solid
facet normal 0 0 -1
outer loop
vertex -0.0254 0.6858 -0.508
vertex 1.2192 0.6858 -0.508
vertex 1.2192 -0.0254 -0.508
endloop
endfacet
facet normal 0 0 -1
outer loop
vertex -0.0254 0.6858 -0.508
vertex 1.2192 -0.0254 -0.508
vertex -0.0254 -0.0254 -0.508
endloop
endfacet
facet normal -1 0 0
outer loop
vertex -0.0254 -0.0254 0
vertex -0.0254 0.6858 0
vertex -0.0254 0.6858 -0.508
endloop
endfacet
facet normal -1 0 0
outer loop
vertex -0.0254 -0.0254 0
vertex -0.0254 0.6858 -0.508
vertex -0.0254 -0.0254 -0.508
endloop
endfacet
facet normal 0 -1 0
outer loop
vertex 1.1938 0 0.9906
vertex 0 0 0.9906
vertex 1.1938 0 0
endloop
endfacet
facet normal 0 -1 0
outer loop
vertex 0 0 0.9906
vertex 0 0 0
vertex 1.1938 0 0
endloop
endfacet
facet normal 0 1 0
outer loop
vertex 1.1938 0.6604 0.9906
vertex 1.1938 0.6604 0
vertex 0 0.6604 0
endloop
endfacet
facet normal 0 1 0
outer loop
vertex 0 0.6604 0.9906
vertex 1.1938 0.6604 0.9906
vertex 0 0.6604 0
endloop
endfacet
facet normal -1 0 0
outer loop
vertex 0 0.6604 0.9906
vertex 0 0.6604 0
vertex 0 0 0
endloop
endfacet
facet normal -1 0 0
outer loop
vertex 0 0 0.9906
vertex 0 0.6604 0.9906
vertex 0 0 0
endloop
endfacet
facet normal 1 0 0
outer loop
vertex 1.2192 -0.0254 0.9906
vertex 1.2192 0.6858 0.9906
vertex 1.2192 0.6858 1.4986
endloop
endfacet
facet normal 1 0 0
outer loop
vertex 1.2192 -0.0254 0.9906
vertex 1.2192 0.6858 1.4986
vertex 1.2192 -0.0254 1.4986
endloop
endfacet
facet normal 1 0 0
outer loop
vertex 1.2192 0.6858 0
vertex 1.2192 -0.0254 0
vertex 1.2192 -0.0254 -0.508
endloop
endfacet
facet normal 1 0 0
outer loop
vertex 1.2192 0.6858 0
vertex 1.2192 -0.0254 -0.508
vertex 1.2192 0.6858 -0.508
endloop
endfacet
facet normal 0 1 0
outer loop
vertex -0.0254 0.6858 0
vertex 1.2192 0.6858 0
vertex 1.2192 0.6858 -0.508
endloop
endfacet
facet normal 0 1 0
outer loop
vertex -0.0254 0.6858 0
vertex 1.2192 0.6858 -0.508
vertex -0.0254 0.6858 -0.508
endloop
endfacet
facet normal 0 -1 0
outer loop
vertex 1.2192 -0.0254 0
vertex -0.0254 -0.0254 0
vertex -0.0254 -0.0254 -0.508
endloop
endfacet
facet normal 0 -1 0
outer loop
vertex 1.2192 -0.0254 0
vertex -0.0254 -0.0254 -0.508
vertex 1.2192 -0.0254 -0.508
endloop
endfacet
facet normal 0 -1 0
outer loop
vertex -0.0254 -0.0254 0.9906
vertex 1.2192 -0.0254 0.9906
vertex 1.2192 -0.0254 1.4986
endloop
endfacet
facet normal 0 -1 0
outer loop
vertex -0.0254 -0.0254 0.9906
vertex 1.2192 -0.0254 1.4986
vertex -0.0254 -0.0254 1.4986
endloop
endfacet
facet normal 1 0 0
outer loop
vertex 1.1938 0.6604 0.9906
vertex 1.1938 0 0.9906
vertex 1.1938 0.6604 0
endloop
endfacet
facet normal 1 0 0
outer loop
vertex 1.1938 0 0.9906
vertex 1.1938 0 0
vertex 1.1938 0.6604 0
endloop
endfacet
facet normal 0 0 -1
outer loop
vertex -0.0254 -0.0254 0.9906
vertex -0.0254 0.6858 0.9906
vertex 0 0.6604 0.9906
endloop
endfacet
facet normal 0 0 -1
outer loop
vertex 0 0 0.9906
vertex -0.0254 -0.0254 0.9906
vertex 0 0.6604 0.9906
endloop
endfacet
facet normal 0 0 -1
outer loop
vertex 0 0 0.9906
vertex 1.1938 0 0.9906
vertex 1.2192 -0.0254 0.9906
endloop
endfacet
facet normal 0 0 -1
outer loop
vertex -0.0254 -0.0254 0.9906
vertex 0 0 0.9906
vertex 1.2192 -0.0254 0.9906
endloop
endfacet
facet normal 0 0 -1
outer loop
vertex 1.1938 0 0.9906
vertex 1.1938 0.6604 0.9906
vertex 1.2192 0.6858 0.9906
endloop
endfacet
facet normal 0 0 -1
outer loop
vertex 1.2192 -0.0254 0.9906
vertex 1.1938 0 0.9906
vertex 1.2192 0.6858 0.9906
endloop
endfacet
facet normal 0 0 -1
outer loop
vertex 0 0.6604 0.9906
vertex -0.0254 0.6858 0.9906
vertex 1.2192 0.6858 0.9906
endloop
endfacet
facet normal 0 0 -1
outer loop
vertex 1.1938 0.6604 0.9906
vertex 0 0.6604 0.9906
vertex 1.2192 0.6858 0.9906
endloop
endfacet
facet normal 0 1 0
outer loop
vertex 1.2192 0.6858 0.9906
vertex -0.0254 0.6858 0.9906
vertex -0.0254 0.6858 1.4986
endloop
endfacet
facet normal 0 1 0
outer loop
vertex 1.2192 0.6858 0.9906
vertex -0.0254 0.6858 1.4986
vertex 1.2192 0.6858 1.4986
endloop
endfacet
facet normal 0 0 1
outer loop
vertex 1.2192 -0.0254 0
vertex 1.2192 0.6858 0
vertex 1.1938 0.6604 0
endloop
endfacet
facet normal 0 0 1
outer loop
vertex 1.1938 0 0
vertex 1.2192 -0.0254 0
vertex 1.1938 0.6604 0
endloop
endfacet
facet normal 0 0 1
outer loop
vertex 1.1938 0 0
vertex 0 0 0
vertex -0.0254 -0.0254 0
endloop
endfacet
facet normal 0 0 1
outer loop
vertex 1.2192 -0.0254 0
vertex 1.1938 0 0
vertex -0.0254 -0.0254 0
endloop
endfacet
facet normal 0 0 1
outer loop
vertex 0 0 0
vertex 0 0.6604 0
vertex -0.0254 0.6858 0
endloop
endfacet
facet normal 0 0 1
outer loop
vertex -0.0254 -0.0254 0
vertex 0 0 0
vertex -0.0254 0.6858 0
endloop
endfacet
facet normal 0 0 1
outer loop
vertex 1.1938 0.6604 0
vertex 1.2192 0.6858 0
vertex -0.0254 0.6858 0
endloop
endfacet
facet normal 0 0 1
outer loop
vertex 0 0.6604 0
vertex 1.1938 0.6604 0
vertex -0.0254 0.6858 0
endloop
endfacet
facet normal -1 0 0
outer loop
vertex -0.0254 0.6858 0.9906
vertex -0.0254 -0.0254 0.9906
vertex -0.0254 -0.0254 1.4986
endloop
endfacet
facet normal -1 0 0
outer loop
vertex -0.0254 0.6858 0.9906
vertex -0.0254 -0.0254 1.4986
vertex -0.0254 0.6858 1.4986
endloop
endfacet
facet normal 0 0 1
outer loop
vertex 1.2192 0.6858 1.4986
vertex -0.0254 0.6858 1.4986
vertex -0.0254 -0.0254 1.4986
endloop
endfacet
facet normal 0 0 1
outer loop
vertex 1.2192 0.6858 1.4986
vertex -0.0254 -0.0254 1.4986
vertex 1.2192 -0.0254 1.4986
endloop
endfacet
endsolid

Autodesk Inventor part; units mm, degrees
ref_plane "YZ Plane" through (0, 0, 0) normal (1, 0, 0) x (0, 1, 0)
ref_plane "XZ Plane" through (0, 0, 0) normal (0, 1, 0) x (-1, 0, 0)
ref_plane "XY Plane" through (0, 0, 0) normal (0, 0, 1) x (1, 0, 0)
sketch "Sketch1" plane through (0, 0, 0) normal (0, 0, 1) x (1, 0, 0)
  line L0 (0, 0) -> (1.1938, 0)
  line L1 (1.1938, 0) -> (1.1938, 0.6604)
  line L2 (1.1938, 0.6604) -> (0, 0.6604)
  line L3 (0, 0.6604) -> (0, 0)
  dimension "d0" = 0.6604
  dimension "d1" = 1.1938
extrude "Extrusion1" add sketch "Sketch1" along normal blind 0.9906
sketch "Sketch2" plane through (0, 0, 0.9906) normal (0, 0, 1) x (1, 0, 0)
  line L0 (-0.0254, 0.6858) -> (1.2192, 0.6858)
  line L1 (1.2192, 0.6858) -> (1.2192, -0.0254)
  line L2 (1.2192, -0.0254) -> (-0.0254, -0.0254)
  line L3 (-0.0254, -0.0254) -> (-0.0254, 0.6858)
  line L4 (1.1938, 0) -> (1.1938, 0.6604) projected
  line L5 (0, 0.6604) -> (0, 0) projected
  line L6 (1.1938, 0.6604) -> (0, 0.6604) projected
  line L7 (0, 0) -> (1.1938, 0) projected
  dimension "d4" = 0.0254
  dimension "d5" = 0.0254
  dimension "d6" = 0.0254
  dimension "d7" = 0.0254
extrude "Extrusion2" add sketch "Sketch2" along normal blind 0.508 contours L0 L1 L2 L3 | L7 L5 L6 L4
sketch "Sketch3" plane through (0, 0, 0) normal (0, 0, -1) x (-1, 0, 0)
  line L0 (0.0254, -0.0254) -> (-1.2192, -0.0254)
  line L1 (-1.2192, -0.0254) -> (-1.2192, 0.6858)
  line L2 (-1.2192, 0.6858) -> (0.0254, 0.6858)
  line L3 (0.0254, 0.6858) -> (0.0254, -0.0254)
  point P0 (0, 0)
extrude "Extrusion3" add sketch "Sketch3" along normal blind 0.508
properties part number "s1k Resistor"
